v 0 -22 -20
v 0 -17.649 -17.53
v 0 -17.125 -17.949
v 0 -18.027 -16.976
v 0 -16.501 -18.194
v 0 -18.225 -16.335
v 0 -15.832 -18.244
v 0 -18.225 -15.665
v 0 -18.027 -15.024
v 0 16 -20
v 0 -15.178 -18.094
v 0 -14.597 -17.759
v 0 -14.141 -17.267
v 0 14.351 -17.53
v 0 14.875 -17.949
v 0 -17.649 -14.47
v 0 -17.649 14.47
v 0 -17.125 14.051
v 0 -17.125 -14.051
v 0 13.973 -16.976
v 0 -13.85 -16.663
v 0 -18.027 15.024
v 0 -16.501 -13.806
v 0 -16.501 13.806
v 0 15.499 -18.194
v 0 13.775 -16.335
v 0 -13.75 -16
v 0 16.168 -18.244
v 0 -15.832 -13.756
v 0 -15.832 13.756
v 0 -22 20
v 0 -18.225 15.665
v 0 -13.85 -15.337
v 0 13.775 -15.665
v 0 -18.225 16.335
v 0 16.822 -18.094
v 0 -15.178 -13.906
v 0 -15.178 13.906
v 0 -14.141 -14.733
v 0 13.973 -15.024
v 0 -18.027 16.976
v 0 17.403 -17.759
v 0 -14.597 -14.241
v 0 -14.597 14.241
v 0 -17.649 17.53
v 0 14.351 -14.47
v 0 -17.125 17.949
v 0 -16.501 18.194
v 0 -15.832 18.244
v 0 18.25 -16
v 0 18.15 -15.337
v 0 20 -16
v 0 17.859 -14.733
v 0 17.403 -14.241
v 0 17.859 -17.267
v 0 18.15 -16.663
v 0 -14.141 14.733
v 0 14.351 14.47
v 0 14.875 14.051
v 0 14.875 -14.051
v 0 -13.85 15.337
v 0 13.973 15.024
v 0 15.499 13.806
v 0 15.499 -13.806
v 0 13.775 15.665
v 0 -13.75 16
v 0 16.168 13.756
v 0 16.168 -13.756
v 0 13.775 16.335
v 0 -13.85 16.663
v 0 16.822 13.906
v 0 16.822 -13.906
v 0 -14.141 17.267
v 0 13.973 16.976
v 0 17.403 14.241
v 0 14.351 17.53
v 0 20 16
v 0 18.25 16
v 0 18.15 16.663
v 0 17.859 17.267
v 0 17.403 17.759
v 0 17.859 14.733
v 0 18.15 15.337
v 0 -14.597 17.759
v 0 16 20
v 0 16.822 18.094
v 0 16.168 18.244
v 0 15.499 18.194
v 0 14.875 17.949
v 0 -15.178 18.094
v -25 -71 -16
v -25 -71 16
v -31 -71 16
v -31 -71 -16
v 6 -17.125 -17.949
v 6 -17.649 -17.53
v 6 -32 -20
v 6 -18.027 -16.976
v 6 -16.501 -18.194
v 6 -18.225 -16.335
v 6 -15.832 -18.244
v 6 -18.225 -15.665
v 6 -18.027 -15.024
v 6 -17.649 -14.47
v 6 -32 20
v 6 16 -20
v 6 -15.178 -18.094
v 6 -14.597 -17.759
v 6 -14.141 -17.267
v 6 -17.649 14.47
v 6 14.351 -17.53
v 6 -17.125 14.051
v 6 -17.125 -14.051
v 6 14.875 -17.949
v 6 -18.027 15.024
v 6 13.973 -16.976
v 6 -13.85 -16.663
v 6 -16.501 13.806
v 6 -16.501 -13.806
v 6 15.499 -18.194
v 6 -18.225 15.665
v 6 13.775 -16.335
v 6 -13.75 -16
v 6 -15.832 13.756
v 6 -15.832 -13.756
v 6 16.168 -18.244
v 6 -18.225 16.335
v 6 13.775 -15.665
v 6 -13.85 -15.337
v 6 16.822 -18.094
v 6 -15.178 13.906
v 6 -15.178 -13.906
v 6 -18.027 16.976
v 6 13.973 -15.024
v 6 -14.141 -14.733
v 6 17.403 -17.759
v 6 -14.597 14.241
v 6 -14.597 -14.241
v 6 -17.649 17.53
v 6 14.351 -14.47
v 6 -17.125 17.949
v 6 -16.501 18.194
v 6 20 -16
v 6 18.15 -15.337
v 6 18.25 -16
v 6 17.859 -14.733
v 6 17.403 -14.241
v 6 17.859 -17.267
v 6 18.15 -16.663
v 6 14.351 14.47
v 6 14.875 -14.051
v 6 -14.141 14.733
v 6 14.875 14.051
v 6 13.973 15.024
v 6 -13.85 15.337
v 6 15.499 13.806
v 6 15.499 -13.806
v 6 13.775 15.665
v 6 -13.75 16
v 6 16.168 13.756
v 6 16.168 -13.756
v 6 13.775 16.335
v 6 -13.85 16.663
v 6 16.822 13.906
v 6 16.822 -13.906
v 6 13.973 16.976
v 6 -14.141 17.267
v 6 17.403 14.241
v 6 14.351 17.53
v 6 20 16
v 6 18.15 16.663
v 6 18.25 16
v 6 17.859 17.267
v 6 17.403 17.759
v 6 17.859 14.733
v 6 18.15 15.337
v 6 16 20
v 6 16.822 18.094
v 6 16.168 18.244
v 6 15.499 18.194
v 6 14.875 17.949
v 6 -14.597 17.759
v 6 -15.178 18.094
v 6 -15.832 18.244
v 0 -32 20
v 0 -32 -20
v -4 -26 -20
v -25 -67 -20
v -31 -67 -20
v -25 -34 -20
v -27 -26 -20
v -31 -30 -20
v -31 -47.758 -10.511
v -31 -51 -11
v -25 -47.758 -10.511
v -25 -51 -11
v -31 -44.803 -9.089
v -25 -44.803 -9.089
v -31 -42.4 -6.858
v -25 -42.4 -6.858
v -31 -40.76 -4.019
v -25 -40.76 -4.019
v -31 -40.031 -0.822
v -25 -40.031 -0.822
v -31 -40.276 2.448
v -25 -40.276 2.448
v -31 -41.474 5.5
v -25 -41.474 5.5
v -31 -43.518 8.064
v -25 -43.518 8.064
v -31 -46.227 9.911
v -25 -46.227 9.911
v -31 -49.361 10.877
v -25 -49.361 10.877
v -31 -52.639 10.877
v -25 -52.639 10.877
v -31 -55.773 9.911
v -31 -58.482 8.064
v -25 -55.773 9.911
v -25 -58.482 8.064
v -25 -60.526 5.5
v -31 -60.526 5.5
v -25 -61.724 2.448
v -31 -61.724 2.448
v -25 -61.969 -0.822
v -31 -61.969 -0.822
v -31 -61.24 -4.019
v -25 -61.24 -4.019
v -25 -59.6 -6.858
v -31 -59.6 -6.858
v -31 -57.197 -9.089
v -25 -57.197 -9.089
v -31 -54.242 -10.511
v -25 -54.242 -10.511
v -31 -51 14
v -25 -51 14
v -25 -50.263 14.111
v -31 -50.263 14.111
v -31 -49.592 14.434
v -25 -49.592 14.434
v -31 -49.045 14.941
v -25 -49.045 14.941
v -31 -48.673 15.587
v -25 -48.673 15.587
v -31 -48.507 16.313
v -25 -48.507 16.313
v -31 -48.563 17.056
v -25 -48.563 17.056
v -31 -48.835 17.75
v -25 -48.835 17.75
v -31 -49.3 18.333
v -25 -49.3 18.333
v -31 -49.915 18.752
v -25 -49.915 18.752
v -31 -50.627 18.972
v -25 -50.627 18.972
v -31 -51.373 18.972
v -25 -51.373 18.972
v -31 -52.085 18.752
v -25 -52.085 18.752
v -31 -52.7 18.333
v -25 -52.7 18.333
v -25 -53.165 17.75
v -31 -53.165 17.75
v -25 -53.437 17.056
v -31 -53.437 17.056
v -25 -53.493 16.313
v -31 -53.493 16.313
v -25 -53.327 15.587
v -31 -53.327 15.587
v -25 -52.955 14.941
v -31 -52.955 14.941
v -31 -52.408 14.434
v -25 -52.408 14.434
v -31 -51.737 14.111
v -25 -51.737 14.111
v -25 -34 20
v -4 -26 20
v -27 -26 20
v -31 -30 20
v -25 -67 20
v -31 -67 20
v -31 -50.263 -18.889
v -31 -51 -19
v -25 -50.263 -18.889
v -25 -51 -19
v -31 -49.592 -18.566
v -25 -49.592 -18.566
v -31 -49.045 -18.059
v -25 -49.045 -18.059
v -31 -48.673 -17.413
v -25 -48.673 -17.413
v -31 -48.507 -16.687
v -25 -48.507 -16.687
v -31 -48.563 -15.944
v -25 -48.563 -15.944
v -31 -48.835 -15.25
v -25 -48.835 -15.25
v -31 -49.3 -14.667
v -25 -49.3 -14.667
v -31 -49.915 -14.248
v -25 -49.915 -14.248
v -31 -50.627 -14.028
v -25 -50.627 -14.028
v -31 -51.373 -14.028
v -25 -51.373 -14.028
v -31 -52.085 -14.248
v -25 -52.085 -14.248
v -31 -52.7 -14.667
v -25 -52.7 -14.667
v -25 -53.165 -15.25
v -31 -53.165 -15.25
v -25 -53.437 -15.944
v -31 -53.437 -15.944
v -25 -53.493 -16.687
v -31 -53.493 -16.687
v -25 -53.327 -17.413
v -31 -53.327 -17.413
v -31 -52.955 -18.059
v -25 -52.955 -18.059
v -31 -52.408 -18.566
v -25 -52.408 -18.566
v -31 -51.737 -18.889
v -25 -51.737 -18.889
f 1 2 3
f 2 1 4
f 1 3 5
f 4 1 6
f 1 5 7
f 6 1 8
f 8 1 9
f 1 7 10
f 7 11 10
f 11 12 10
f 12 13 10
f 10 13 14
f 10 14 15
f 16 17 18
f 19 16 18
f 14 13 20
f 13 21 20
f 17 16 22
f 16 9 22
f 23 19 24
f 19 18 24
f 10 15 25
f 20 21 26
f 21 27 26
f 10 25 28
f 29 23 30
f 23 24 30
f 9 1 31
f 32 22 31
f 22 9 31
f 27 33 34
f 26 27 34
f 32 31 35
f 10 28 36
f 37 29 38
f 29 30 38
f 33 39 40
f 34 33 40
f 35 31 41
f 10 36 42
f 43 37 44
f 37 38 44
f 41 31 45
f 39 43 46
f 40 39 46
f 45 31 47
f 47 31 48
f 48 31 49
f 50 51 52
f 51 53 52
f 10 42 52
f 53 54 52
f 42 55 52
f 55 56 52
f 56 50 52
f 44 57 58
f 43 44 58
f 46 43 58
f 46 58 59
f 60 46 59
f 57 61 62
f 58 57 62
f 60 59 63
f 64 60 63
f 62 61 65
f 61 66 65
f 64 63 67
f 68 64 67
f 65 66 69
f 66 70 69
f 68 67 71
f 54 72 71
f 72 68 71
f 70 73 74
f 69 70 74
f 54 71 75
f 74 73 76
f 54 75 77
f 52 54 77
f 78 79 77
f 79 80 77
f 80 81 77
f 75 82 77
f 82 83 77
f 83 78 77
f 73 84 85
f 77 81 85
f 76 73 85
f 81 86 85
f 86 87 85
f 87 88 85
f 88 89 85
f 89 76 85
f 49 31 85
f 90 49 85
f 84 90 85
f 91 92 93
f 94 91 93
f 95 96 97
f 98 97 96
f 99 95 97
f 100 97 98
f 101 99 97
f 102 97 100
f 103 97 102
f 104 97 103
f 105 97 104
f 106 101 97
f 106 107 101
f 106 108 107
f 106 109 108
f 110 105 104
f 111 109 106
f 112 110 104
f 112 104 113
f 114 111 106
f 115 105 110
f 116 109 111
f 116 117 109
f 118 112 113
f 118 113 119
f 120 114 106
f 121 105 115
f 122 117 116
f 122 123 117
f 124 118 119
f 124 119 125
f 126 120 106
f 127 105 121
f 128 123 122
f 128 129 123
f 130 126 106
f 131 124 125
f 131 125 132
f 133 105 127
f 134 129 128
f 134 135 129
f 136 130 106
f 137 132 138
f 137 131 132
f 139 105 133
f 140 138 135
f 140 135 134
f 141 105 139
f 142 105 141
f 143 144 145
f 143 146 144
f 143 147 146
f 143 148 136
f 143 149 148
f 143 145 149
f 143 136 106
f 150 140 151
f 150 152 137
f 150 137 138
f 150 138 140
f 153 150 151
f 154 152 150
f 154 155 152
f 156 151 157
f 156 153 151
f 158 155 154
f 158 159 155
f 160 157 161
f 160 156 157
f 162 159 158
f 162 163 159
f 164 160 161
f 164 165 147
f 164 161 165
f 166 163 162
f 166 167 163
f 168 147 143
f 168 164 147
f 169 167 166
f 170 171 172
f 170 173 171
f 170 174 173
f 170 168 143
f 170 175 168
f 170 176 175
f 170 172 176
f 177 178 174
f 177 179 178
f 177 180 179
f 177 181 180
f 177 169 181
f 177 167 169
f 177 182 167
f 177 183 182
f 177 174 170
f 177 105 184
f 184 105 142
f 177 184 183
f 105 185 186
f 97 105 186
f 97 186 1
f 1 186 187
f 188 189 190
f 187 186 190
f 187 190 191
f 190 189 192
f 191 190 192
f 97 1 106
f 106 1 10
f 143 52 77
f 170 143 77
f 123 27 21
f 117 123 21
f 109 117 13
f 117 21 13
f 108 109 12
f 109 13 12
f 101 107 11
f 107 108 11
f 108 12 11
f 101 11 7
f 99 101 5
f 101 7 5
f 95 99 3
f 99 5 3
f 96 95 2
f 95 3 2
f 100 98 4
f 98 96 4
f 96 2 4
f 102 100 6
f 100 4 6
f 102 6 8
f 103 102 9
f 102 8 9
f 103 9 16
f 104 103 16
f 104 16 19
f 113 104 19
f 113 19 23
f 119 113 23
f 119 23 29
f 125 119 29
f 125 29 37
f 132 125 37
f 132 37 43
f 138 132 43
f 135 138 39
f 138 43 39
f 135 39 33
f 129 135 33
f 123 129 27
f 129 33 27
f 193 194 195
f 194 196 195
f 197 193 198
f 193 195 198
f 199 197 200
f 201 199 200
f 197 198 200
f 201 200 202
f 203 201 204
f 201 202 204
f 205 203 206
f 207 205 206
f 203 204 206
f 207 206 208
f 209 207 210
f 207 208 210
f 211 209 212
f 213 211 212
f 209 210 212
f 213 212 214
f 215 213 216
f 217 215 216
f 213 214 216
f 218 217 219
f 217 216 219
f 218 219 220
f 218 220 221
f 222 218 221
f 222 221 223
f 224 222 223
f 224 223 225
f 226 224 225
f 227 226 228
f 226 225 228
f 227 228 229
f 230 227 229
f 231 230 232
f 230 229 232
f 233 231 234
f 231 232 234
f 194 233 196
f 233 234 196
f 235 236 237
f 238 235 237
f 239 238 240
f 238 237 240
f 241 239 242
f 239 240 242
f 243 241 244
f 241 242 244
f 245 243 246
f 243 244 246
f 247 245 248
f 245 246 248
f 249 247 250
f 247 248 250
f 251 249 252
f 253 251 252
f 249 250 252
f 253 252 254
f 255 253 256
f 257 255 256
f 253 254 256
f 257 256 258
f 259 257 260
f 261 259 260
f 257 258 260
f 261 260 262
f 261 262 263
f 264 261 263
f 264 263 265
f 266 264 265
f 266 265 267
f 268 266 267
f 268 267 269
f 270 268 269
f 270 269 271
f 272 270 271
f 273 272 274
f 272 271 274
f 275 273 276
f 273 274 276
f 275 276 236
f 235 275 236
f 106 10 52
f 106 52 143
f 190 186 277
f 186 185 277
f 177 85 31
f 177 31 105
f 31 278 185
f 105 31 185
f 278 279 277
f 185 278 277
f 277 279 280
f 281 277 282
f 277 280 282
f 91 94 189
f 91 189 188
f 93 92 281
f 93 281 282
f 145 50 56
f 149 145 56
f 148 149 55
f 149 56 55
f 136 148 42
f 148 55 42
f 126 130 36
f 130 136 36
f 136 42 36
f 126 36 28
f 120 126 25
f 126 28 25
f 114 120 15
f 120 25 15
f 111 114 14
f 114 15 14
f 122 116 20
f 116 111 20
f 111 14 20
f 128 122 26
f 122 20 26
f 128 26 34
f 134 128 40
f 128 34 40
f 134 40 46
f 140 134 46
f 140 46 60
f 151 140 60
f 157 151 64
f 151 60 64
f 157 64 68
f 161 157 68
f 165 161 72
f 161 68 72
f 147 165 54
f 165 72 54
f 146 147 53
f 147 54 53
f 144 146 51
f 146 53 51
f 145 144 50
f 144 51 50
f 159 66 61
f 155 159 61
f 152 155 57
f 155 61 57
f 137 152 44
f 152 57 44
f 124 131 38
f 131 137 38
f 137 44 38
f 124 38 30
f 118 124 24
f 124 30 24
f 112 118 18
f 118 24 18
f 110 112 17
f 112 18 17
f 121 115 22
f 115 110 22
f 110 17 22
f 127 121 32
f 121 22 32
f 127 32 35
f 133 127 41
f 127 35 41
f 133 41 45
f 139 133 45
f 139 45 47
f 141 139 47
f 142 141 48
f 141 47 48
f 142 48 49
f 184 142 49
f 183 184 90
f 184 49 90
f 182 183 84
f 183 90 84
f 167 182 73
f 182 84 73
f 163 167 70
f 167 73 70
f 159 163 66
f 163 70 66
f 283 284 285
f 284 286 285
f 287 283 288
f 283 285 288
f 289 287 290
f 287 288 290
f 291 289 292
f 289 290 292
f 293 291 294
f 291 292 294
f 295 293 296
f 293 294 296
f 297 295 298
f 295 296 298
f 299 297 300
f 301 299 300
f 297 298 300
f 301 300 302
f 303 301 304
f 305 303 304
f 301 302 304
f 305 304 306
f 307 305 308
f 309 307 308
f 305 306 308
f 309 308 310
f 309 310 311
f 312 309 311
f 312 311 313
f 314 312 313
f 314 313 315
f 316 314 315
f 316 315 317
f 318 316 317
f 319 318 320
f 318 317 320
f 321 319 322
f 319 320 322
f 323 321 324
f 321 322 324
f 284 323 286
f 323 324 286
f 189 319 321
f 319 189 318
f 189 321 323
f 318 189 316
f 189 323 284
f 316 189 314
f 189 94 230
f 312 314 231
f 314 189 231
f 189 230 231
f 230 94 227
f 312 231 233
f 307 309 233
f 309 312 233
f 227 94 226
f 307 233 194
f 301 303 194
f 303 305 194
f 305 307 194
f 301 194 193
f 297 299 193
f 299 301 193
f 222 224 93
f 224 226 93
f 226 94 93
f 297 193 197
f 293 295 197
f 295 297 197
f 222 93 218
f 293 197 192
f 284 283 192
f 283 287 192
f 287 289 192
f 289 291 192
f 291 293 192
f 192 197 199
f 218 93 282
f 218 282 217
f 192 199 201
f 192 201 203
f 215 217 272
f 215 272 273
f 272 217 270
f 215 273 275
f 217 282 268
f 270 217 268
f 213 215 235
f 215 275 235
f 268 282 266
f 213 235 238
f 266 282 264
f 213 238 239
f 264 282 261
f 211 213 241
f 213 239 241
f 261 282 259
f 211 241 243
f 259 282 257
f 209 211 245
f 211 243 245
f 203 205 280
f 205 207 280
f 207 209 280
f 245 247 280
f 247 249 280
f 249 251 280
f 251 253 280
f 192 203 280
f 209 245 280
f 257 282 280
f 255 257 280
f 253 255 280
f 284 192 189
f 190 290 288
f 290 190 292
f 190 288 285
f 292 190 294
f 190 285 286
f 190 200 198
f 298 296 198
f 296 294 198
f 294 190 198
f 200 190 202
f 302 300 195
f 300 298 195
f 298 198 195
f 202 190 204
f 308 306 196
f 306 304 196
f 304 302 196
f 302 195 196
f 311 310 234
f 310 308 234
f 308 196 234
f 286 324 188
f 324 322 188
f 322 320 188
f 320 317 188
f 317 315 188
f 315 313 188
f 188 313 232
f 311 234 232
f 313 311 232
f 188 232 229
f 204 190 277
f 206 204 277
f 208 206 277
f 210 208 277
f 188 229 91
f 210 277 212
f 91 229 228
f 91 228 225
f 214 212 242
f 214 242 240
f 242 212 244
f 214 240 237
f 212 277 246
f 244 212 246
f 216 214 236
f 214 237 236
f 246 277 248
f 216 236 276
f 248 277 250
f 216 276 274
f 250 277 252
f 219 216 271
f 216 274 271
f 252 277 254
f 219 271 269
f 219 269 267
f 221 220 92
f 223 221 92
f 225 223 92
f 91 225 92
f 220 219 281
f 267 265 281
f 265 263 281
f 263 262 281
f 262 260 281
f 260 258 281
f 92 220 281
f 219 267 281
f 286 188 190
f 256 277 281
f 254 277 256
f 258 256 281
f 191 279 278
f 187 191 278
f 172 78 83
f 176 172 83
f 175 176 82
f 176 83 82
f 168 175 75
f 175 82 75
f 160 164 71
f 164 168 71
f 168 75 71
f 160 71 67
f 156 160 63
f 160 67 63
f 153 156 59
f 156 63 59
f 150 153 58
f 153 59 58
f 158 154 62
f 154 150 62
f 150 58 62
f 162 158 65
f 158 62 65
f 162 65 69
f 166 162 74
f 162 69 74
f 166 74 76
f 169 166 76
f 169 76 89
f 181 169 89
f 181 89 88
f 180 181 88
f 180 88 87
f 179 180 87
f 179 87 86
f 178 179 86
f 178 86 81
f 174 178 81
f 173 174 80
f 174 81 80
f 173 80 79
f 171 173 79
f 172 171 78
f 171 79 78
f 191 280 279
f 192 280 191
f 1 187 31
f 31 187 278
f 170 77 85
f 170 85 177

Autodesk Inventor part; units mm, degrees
ref_plane "YZ Plane" through (0, 0, 0) normal (1, 0, 0) x (0, 1, 0)
ref_plane "XZ Plane" through (0, 0, 0) normal (0, 1, 0) x (-1, 0, 0)
ref_plane "XY Plane" through (0, 0, 0) normal (0, 0, 1) x (1, 0, 0)
sketch "Skizze1" plane through (0, 0, 0) normal (1, 0, 0) x (0, 1, 0)
  line L0 (-20, -20) -> (20, -20)
  line L1 (20, -20) -> (20, 20)
  line L2 (20, 20) -> (-20, 20)
  line L3 (-20, 20) -> (-20, -20)
  line L4 (-20, -20) -> (20, 20) construction
  line L5 (20, -20) -> (-20, 20) construction
  line L6 (-16, -16) -> (16, -16) construction
  line L7 (16, -16) -> (16, 16) construction
  line L8 (16, 16) -> (-16, 16) construction
  line L9 (-16, 16) -> (-16, -16) construction
  line L10 (-16, -16) -> (16, 16) construction
  line L11 (16, -16) -> (-16, 16) construction
  circle A0 centre (16, 16) radius 2.25
  circle A1 centre (16, -16) radius 2.25
  circle A2 centre (-16, -16) radius 2.25
  circle A3 centre (-16, 16) radius 2.25
  line L12 (-20, 20) -> (-32, 20)
  line L13 (-32, 20) -> (-32, -20)
  line L14 (-32, -20) -> (-20, -20)
  line L15 (-20, -20) -> (-20, 20)
  point P0 (0, 0)
  dimension "d0" = 40
  dimension "d1" = 40
  dimension "d2" = 32
  dimension "d3" = 32
  dimension "d4" = 4.5
  dimension "d5" = 4.5
  dimension "d6" = 4.5
  dimension "d7" = 4.5
  dimension "d8" = 12
extrude "Extrusion1" add sketch "Skizze1" along normal blind 6
ref_plane "Arbeitsebene1" through (0, -32, 20) normal (0, 0, 1) x (1, 0, 0)
sketch "Skizze2" plane through (0, -32, 20) normal (0, 0, 1) x (1, 0, 0)
  line L0 (0, 52) -> (0, 0) projected
  line L1 (0, 0) -> (6, 0) projected
  line L2 (6, 52) -> (6, 0) projected
  line L3 (0, 52) -> (6, 52) projected
  line L4 (-31, 6) -> (-25, 6)
  line L5 (-25, 6) -> (-25, -39)
  line L6 (-25, -39) -> (-31, -39)
  line L7 (-31, -39) -> (-31, 6)
  line L8 (0, 0) -> (-25, -2)
  line L9 (-25, 6) -> (0, 6)
  point P0 (0, 32)
  point P1 (-28, -39)
  point P2 (-28, 6)
  dimension "d12" = 6
  dimension "d13" = 45
  dimension "d14" = 6
  dimension "d15" = 25
  dimension "d16" = 8
extrude "Extrusion2" add sketch "Skizze2" against normal up to surface (40 mm away) contours L0 L8 L5 L9 | L5 L6 L7 L4
chamfer "Fasen1" distance 4 angle 45 6 edges at (-31, -26, 0) (0, -26, 0) (-28, -71, -20) (-28, -71, 20) (3, 20, -20) (3, 20, 20)
sketch "Skizze3" plane through (-25, -34, 20) normal (1, 0, 0) x (0, 0, -1)
  line L0 (4, -37) -> (0, -33) projected
  line L1 (4, -37) -> (36, -37) projected
  line L2 (40, -33) -> (36, -37) projected
  line L3 (40, 0) -> (40, -33) projected
  line L4 (0, 0) -> (40, 0) projected
  line L5 (0, -33) -> (0, 0) projected
  circle A0 centre (20, -17) radius 20
  circle A1 centre (20, -17) radius 16.5
  point P0 (20, 34)
  dimension "d22" = 33
extrude "Extrusion3" cut sketch "Skizze3" along normal through all contours A1
sketch "Skizze4" plane through (-25, -67, 20) normal (1, 0, 0) x (0, 0, -1)
  line L0 (0, 33) -> (40, 33) projected
  line L1 (0, 0) -> (0, 33) projected
  line L2 (4, -4) -> (0, 0) projected
  line L3 (4, -4) -> (36, -4) projected
  line L4 (40, 0) -> (36, -4) projected
  line L5 (40, 33) -> (40, 0) projected
  circle A0 centre (20, 16) radius 16.5
  circle A1 centre (3.5, 16) radius 2.5
  circle A2 centre (36.5, 16) radius 2.5
  point P0 (20, 67)
  dimension "d25" = 5
  dimension "d26" = 5
extrude "Extrusion4" cut sketch "Skizze4" against normal blind 10 contours A0 A2 | A0 A2 | A1 A0 | A0 A1
sketch "Skizze5" plane through (-25, -67, 20) normal (1, 0, 0) x (0, 0, -1)
  line L0 (0, 35) -> (40, 35) projected
  line L1 (0, 33) -> (0, 35) projected
  line L2 (0, 33) -> (40, 33) projected
  circle A0 centre (20, 16) radius 11
  line L3 (40, 35) -> (40, 33) projected
  point P0 (20, 67)
  dimension "d29" = 22
extrude "Extrusion5" cut sketch "Skizze5" against normal blind 10 contours A0
properties part number "40_XYZstage_micrometer_motorized_nema8_samplemount_angle_distance_24mm"
